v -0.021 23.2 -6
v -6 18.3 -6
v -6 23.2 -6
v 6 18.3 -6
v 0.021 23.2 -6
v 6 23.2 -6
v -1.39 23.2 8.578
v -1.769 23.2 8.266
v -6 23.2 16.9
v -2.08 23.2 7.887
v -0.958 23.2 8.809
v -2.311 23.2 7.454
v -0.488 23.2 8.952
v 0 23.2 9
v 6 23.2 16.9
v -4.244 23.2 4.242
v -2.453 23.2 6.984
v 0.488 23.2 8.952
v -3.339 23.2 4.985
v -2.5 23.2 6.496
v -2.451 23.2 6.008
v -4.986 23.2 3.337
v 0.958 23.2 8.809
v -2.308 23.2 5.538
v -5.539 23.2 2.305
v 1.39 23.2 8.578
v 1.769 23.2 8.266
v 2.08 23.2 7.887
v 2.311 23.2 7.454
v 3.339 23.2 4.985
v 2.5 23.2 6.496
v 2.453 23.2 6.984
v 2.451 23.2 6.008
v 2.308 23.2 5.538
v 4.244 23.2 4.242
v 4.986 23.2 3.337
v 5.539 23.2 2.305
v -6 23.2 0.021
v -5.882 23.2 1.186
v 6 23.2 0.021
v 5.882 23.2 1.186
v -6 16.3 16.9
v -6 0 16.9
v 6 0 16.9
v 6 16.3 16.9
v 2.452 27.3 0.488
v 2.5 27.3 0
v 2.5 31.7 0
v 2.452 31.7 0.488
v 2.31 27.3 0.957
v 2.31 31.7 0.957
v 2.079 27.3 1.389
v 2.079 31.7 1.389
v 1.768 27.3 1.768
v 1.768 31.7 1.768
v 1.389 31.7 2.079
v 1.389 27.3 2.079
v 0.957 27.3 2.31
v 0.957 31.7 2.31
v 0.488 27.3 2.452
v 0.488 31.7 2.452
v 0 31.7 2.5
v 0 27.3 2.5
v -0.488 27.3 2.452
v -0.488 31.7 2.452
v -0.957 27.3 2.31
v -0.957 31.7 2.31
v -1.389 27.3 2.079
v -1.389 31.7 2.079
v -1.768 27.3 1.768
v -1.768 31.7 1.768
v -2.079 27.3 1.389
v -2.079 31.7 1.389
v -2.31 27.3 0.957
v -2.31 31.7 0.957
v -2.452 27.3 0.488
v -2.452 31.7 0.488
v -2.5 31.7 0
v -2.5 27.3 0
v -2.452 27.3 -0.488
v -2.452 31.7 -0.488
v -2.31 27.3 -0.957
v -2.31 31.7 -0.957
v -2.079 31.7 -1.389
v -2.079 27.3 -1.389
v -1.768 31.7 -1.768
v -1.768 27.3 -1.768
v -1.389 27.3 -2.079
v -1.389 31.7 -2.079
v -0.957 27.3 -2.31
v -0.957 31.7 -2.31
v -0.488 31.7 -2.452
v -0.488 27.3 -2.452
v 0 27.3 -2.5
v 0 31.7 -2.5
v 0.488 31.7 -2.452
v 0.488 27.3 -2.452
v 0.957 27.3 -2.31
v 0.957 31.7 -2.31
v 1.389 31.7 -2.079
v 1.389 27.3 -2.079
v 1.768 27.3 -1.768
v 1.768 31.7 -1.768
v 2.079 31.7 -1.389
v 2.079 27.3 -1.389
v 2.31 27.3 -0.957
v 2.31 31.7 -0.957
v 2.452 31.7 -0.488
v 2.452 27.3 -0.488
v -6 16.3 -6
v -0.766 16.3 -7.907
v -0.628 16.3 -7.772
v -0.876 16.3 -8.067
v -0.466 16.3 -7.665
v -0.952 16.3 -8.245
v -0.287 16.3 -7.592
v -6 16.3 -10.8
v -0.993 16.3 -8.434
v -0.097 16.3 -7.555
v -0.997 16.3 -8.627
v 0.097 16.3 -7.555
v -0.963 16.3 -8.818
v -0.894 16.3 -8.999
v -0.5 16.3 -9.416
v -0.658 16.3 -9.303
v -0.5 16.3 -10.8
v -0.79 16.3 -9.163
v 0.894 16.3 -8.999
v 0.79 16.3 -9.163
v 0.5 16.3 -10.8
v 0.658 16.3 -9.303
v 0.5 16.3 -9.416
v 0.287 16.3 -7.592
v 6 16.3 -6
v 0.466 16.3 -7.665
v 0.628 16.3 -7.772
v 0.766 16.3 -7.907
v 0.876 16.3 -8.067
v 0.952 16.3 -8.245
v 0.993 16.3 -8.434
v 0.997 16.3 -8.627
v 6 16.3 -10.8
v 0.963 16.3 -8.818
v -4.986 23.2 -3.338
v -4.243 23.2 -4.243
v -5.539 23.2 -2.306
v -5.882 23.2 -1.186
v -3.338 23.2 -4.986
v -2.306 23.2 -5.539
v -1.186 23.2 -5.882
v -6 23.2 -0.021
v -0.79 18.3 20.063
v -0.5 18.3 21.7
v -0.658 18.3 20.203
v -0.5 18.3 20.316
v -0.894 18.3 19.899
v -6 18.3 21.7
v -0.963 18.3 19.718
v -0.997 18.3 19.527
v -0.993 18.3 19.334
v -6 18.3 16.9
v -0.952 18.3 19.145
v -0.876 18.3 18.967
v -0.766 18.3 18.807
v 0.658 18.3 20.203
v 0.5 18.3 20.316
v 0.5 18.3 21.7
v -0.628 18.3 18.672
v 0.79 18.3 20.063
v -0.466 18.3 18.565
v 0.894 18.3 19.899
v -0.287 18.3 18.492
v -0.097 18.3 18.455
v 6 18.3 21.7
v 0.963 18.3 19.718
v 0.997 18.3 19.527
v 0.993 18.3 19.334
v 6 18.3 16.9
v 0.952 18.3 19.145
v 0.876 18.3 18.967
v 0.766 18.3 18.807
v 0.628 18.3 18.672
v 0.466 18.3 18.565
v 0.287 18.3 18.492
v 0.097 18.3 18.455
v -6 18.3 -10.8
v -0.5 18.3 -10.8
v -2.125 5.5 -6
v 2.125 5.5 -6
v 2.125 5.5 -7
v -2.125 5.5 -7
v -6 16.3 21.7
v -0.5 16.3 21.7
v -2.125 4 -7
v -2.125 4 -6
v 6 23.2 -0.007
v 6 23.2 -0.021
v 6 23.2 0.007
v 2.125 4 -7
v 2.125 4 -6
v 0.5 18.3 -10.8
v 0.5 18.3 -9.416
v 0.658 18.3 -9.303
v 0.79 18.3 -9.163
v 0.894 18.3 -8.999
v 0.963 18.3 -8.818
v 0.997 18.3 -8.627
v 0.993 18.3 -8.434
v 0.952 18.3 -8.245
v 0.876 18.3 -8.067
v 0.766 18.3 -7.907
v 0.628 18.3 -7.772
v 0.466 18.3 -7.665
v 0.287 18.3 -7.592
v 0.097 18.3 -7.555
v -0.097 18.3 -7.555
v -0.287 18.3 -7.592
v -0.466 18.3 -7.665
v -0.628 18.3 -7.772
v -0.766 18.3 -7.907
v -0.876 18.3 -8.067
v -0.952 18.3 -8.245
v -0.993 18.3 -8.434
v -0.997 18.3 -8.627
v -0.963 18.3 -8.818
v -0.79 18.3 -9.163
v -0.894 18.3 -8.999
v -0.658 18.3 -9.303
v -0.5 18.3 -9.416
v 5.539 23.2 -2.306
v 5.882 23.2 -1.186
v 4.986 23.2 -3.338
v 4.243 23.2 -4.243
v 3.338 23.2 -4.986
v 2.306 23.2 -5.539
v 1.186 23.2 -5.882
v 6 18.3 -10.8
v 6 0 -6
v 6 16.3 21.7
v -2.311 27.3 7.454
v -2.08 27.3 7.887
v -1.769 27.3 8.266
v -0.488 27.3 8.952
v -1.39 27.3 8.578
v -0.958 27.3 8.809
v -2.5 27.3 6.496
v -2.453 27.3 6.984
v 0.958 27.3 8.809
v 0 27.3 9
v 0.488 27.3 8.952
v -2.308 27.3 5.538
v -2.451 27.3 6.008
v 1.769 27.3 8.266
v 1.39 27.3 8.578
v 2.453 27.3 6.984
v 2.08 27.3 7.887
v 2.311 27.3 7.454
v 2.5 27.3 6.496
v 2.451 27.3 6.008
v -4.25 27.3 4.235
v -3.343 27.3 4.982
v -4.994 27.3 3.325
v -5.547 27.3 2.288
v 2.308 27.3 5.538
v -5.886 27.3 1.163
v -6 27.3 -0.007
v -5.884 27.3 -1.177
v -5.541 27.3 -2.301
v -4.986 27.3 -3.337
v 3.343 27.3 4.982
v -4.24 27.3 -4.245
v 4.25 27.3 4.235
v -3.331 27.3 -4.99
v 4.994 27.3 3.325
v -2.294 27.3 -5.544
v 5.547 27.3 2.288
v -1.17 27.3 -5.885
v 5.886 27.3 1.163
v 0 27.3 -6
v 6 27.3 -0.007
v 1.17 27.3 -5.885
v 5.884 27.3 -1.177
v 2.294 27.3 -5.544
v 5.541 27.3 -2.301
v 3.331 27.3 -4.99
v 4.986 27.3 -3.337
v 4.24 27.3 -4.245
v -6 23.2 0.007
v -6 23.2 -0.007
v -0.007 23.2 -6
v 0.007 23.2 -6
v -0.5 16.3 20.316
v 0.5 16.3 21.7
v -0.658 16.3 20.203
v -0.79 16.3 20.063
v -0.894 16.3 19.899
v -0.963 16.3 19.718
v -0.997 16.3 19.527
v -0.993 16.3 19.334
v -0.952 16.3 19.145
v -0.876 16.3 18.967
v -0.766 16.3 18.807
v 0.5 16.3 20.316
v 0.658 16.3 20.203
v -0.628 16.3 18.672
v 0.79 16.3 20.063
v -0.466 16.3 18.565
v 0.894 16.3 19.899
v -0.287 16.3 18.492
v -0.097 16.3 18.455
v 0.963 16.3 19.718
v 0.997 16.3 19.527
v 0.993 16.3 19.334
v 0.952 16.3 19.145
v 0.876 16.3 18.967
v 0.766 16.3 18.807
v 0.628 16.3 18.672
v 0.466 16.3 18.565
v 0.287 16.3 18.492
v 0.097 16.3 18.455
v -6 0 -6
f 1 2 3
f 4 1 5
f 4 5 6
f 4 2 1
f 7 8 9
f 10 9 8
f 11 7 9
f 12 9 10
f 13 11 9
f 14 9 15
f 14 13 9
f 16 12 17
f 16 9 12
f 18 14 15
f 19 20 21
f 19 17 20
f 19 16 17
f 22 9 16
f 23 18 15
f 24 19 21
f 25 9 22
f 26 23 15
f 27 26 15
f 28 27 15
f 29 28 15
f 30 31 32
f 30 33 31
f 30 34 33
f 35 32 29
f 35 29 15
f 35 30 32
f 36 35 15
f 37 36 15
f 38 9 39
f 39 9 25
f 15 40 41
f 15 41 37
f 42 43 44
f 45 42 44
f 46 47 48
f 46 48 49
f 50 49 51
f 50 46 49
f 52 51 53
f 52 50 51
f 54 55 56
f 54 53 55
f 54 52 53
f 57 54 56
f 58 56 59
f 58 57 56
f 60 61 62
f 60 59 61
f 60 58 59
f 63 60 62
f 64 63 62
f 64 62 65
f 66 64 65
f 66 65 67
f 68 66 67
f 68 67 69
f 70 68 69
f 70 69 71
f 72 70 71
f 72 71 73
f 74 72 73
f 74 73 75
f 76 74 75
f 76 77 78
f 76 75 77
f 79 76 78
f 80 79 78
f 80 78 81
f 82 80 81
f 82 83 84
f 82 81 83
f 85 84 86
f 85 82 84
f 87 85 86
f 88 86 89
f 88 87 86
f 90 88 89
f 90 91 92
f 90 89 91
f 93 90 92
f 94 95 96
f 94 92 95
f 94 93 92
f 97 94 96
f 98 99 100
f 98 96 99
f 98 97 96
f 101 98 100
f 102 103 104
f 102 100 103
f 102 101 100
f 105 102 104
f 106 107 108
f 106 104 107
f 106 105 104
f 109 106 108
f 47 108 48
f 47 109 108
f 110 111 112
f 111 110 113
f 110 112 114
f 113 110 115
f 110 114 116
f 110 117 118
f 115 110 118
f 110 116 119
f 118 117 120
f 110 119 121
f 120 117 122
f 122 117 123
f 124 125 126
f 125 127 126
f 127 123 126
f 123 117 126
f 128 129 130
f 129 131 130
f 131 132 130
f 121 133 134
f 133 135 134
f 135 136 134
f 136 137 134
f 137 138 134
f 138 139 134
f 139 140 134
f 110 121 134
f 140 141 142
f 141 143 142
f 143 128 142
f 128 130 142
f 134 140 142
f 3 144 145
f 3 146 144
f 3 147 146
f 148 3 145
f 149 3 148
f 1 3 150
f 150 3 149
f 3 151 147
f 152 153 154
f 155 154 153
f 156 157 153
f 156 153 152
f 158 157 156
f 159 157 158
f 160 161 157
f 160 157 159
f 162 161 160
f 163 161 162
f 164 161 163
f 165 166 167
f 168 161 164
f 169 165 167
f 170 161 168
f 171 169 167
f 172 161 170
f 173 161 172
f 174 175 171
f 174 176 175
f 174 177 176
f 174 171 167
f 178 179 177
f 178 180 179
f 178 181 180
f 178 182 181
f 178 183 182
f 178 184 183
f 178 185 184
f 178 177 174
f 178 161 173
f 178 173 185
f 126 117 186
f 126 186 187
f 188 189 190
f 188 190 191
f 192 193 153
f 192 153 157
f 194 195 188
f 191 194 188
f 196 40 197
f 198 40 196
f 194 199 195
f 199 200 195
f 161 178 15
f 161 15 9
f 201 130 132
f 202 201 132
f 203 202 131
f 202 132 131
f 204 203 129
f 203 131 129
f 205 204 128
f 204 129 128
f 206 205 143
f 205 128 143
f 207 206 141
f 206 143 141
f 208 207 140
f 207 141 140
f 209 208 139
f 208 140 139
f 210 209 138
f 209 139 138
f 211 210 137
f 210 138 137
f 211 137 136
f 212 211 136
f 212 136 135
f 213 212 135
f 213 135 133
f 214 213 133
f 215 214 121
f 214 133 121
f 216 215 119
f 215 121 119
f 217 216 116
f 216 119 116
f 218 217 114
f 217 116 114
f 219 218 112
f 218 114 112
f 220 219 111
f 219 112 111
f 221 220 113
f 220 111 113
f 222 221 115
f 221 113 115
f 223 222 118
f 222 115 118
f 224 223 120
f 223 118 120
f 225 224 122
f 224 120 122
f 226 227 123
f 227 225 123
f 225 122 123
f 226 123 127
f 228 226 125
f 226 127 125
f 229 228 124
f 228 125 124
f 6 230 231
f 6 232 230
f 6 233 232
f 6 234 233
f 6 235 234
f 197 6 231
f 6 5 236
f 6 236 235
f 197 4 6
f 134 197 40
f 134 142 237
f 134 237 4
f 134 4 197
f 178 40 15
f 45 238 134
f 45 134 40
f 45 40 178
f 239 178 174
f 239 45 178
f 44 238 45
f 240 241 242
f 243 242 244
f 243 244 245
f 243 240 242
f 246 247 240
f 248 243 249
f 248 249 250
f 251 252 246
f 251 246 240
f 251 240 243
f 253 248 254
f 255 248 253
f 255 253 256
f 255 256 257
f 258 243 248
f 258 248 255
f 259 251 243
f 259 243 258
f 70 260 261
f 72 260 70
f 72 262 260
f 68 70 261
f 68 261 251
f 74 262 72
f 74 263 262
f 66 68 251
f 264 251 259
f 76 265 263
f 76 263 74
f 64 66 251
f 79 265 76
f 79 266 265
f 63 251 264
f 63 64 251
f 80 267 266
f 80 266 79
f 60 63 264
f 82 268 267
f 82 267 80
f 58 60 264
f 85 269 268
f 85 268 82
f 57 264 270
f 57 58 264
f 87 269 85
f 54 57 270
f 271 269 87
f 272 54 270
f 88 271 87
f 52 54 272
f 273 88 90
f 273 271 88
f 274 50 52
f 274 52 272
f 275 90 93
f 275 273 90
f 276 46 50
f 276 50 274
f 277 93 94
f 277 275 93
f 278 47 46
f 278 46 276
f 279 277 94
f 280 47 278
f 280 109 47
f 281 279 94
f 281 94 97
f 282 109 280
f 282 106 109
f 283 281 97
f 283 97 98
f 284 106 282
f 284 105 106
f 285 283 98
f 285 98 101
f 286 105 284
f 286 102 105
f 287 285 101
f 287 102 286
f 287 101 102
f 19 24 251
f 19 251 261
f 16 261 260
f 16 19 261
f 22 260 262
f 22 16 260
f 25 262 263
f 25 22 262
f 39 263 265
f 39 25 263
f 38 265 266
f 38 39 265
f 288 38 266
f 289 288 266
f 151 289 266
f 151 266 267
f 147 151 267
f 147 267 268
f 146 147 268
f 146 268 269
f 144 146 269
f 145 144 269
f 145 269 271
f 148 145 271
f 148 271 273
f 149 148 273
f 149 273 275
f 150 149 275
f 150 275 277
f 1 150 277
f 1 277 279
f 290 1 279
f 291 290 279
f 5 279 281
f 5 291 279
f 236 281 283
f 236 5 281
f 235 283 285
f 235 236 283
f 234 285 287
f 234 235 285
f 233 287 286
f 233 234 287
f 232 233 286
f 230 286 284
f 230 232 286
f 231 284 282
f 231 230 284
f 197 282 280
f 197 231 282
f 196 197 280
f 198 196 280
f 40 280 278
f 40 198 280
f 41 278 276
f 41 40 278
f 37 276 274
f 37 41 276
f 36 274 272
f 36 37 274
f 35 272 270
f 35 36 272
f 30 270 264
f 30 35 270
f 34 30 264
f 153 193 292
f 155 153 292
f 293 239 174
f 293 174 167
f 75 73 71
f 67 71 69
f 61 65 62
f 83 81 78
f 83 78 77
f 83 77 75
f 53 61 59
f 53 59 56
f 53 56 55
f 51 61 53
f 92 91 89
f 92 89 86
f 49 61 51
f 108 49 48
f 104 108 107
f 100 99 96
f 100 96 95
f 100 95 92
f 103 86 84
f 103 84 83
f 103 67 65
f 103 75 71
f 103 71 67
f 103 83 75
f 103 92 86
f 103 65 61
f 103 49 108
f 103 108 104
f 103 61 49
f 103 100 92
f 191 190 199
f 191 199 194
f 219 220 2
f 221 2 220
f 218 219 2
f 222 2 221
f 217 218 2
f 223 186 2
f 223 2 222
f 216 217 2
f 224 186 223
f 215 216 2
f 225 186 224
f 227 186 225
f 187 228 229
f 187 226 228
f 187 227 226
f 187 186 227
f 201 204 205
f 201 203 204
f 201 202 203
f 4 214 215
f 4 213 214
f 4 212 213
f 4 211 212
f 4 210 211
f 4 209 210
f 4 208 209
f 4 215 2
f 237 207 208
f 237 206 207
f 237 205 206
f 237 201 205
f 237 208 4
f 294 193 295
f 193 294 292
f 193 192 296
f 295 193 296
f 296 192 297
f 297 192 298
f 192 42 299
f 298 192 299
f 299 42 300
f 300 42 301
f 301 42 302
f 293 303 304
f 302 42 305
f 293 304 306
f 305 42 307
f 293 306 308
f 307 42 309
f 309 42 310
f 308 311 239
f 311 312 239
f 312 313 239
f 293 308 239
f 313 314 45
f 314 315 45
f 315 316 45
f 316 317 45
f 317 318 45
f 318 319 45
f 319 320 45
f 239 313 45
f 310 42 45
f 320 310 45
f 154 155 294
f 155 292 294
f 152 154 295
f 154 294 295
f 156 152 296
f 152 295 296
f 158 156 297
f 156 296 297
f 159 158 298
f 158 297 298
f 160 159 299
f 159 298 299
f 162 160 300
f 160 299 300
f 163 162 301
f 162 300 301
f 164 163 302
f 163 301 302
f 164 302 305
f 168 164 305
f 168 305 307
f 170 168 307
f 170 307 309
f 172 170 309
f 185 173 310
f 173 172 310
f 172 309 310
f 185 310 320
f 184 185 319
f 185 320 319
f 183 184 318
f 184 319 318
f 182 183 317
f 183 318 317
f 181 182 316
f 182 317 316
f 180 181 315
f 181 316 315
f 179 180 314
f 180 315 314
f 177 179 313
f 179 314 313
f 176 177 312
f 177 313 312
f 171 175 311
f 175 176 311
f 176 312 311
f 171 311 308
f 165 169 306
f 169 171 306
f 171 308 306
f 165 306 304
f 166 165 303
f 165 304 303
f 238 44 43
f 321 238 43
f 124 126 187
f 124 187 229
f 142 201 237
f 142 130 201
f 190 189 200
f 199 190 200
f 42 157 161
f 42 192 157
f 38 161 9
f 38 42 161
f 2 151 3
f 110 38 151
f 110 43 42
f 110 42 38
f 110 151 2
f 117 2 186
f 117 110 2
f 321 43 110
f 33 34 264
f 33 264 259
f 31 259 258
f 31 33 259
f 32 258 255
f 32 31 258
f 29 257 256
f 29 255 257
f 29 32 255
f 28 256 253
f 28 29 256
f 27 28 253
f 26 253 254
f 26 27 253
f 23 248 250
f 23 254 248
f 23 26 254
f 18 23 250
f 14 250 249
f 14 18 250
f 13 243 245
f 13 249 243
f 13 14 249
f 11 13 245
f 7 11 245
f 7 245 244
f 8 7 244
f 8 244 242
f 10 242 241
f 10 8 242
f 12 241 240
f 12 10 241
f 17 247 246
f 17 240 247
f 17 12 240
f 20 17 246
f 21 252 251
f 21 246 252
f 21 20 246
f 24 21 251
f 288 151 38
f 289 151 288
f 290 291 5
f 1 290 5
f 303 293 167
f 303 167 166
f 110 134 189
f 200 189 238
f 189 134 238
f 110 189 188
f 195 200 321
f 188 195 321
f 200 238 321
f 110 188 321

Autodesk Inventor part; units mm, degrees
ref_plane "YZ Plane" through (0, 0, 0) normal (1, 0, 0) x (0, 1, 0)
ref_plane "XZ Plane" through (0, 0, 0) normal (0, 1, 0) x (-1, 0, 0)
ref_plane "XY Plane" through (0, 0, 0) normal (0, 0, 1) x (1, 0, 0)
sketch "Sketch1" plane through (0, 0, 0) normal (0, 1, 0) x (-1, 0, 0)
  line L0 (-6, -6) -> (6, -6)
  line L1 (6, -6) -> (6, 16.9)
  line L2 (6, 16.9) -> (-6, 16.9)
  line L3 (-6, 16.9) -> (-6, -6)
  point P0 (0, 0)
  dimension "d0" = 12
  dimension "d1" = 22.9
extrude "Extrusion1" add sketch "Sketch1" along normal blind 16.3
sketch "Sketch2" plane through (0, 16.3, 0) normal (0, 1, 0) x (1, 0, 0)
  line L0 (6, 10.8) -> (6, -21.7)
  line L1 (-6, -21.7) -> (-6, 10.8)
  line L2 (6, 8.55) -> (6, -19.45)
  line L3 (-6, -19.45) -> (-6, 8.55)
  arc A0 (-0.5, 9.416) -> (0.5, 9.416) centre (0, 8.55) ccw
  line L4 (0.5, 10.8) -> (0.5, 9.416)
  line L5 (-0.5, 10.8) -> (-0.5, 9.416)
  line L6 (-6, 10.8) -> (-0.5, 10.8)
  line L7 (0.5, 10.8) -> (6, 10.8)
  arc A1 (0.5, -20.316) -> (-0.5, -20.316) centre (0, -19.45) ccw
  line L8 (-0.5, -21.7) -> (-0.5, -20.316)
  line L9 (0.5, -21.7) -> (0.5, -20.316)
  line L10 (6, -21.7) -> (0.5, -21.7)
  line L11 (-0.5, -21.7) -> (-6, -21.7)
  line L12 (-6, -16.9) -> (6, -16.9) projected
  line L13 (6, 6) -> (-6, 6) projected
  point P0 (0, 0)
  dimension "d5" = 32.5
  dimension "d12" = 28
  dimension "d28" = 27.7
  dimension "d29" = 22.9
  dimension "d32" = 2.55
  dimension "d33" = 4.8
  dimension "d34" = 1
  dimension "d35" = 12
extrude "Extrusion2" add sketch "Sketch2" along normal blind 2
sketch "Sketch3" plane through (0, 18.3, 0) normal (0, 1, 0) x (1, 0, 0)
  line L0 (-6, 6) -> (6, 6)
  line L1 (6, 6) -> (6, -16.9)
  line L2 (6, -16.9) -> (-6, -16.9)
  line L3 (-6, -16.9) -> (-6, 6)
  point P0 (0, 0)
  dimension "d9" = 22.9
extrude "Extrusion3" add sketch "Sketch3" along normal blind 4.9
sketch "Sketch4" plane through (0, 23.2, 0) normal (0, 1, 0) x (1, 0, 0)
  arc A0 (2.3077, -5.5385) -> (-2.3077, -5.5385) centre (0, 0) ccw
  arc A1 (-2.3077, -5.5385) -> (2.3077, -5.5385) centre (0, -6.5) ccw
extrude "Extrusion4" add sketch "Sketch4" along normal blind 4.1
sketch "Sketch5" plane through (0, 27.3, 0) normal (0, 1, 0) x (1, 0, 0)
  circle A0 centre (0, 0) radius 2.5
  dimension "d18" = 5
extrude "Extrusion5" add sketch "Sketch5" along normal blind 4.4
sketch "Sketch6" plane through (6, 0, -6) normal (0, 0, -1) x (-1, 0, 0)
  line L0 (0, 0) -> (0, 5.5)
  line L1 (0, 5.5) -> (12, 5.5)
  line L2 (6, 4) -> (8.125, 4)
  line L3 (3.875, 4) -> (8.125, 4)
  line L4 (8.125, 4) -> (8.125, 5.5)
  line L5 (8.125, 5.5) -> (3.875, 5.5)
  line L6 (3.875, 5.5) -> (3.875, 4)
  point P0 (6, 0)
  dimension "d22" = 5.5
  dimension "d23" = 4.25
extrude "Extrusion6" add sketch "Sketch6" along normal blind 1
sketch "Sketch7" plane through (0, 31.7, 0) normal (0, 1, 0) x (1, 0, 0)
  line L0 (-6, -16.9) -> (6, -16.9) projected
  line L1 (-6, 0) -> (-6, -16.9) projected
  point P0 (0, 0)
  dimension "d26" = 16.9
  dimension "d27" = 6
sketch "Sketch8" plane through (-6, 0, -6) normal (-1, 0, 0) x (0, 0, 1)
  line L0 (0, 0) -> (22.9, 0) projected
  line L1 (-4.8, 16.3) -> (0, 16.3) projected
  point P0 (6, 0)
  dimension "d30" = 16.3
properties part number "HD-1900A_Servo" material "ABS Plastic"
